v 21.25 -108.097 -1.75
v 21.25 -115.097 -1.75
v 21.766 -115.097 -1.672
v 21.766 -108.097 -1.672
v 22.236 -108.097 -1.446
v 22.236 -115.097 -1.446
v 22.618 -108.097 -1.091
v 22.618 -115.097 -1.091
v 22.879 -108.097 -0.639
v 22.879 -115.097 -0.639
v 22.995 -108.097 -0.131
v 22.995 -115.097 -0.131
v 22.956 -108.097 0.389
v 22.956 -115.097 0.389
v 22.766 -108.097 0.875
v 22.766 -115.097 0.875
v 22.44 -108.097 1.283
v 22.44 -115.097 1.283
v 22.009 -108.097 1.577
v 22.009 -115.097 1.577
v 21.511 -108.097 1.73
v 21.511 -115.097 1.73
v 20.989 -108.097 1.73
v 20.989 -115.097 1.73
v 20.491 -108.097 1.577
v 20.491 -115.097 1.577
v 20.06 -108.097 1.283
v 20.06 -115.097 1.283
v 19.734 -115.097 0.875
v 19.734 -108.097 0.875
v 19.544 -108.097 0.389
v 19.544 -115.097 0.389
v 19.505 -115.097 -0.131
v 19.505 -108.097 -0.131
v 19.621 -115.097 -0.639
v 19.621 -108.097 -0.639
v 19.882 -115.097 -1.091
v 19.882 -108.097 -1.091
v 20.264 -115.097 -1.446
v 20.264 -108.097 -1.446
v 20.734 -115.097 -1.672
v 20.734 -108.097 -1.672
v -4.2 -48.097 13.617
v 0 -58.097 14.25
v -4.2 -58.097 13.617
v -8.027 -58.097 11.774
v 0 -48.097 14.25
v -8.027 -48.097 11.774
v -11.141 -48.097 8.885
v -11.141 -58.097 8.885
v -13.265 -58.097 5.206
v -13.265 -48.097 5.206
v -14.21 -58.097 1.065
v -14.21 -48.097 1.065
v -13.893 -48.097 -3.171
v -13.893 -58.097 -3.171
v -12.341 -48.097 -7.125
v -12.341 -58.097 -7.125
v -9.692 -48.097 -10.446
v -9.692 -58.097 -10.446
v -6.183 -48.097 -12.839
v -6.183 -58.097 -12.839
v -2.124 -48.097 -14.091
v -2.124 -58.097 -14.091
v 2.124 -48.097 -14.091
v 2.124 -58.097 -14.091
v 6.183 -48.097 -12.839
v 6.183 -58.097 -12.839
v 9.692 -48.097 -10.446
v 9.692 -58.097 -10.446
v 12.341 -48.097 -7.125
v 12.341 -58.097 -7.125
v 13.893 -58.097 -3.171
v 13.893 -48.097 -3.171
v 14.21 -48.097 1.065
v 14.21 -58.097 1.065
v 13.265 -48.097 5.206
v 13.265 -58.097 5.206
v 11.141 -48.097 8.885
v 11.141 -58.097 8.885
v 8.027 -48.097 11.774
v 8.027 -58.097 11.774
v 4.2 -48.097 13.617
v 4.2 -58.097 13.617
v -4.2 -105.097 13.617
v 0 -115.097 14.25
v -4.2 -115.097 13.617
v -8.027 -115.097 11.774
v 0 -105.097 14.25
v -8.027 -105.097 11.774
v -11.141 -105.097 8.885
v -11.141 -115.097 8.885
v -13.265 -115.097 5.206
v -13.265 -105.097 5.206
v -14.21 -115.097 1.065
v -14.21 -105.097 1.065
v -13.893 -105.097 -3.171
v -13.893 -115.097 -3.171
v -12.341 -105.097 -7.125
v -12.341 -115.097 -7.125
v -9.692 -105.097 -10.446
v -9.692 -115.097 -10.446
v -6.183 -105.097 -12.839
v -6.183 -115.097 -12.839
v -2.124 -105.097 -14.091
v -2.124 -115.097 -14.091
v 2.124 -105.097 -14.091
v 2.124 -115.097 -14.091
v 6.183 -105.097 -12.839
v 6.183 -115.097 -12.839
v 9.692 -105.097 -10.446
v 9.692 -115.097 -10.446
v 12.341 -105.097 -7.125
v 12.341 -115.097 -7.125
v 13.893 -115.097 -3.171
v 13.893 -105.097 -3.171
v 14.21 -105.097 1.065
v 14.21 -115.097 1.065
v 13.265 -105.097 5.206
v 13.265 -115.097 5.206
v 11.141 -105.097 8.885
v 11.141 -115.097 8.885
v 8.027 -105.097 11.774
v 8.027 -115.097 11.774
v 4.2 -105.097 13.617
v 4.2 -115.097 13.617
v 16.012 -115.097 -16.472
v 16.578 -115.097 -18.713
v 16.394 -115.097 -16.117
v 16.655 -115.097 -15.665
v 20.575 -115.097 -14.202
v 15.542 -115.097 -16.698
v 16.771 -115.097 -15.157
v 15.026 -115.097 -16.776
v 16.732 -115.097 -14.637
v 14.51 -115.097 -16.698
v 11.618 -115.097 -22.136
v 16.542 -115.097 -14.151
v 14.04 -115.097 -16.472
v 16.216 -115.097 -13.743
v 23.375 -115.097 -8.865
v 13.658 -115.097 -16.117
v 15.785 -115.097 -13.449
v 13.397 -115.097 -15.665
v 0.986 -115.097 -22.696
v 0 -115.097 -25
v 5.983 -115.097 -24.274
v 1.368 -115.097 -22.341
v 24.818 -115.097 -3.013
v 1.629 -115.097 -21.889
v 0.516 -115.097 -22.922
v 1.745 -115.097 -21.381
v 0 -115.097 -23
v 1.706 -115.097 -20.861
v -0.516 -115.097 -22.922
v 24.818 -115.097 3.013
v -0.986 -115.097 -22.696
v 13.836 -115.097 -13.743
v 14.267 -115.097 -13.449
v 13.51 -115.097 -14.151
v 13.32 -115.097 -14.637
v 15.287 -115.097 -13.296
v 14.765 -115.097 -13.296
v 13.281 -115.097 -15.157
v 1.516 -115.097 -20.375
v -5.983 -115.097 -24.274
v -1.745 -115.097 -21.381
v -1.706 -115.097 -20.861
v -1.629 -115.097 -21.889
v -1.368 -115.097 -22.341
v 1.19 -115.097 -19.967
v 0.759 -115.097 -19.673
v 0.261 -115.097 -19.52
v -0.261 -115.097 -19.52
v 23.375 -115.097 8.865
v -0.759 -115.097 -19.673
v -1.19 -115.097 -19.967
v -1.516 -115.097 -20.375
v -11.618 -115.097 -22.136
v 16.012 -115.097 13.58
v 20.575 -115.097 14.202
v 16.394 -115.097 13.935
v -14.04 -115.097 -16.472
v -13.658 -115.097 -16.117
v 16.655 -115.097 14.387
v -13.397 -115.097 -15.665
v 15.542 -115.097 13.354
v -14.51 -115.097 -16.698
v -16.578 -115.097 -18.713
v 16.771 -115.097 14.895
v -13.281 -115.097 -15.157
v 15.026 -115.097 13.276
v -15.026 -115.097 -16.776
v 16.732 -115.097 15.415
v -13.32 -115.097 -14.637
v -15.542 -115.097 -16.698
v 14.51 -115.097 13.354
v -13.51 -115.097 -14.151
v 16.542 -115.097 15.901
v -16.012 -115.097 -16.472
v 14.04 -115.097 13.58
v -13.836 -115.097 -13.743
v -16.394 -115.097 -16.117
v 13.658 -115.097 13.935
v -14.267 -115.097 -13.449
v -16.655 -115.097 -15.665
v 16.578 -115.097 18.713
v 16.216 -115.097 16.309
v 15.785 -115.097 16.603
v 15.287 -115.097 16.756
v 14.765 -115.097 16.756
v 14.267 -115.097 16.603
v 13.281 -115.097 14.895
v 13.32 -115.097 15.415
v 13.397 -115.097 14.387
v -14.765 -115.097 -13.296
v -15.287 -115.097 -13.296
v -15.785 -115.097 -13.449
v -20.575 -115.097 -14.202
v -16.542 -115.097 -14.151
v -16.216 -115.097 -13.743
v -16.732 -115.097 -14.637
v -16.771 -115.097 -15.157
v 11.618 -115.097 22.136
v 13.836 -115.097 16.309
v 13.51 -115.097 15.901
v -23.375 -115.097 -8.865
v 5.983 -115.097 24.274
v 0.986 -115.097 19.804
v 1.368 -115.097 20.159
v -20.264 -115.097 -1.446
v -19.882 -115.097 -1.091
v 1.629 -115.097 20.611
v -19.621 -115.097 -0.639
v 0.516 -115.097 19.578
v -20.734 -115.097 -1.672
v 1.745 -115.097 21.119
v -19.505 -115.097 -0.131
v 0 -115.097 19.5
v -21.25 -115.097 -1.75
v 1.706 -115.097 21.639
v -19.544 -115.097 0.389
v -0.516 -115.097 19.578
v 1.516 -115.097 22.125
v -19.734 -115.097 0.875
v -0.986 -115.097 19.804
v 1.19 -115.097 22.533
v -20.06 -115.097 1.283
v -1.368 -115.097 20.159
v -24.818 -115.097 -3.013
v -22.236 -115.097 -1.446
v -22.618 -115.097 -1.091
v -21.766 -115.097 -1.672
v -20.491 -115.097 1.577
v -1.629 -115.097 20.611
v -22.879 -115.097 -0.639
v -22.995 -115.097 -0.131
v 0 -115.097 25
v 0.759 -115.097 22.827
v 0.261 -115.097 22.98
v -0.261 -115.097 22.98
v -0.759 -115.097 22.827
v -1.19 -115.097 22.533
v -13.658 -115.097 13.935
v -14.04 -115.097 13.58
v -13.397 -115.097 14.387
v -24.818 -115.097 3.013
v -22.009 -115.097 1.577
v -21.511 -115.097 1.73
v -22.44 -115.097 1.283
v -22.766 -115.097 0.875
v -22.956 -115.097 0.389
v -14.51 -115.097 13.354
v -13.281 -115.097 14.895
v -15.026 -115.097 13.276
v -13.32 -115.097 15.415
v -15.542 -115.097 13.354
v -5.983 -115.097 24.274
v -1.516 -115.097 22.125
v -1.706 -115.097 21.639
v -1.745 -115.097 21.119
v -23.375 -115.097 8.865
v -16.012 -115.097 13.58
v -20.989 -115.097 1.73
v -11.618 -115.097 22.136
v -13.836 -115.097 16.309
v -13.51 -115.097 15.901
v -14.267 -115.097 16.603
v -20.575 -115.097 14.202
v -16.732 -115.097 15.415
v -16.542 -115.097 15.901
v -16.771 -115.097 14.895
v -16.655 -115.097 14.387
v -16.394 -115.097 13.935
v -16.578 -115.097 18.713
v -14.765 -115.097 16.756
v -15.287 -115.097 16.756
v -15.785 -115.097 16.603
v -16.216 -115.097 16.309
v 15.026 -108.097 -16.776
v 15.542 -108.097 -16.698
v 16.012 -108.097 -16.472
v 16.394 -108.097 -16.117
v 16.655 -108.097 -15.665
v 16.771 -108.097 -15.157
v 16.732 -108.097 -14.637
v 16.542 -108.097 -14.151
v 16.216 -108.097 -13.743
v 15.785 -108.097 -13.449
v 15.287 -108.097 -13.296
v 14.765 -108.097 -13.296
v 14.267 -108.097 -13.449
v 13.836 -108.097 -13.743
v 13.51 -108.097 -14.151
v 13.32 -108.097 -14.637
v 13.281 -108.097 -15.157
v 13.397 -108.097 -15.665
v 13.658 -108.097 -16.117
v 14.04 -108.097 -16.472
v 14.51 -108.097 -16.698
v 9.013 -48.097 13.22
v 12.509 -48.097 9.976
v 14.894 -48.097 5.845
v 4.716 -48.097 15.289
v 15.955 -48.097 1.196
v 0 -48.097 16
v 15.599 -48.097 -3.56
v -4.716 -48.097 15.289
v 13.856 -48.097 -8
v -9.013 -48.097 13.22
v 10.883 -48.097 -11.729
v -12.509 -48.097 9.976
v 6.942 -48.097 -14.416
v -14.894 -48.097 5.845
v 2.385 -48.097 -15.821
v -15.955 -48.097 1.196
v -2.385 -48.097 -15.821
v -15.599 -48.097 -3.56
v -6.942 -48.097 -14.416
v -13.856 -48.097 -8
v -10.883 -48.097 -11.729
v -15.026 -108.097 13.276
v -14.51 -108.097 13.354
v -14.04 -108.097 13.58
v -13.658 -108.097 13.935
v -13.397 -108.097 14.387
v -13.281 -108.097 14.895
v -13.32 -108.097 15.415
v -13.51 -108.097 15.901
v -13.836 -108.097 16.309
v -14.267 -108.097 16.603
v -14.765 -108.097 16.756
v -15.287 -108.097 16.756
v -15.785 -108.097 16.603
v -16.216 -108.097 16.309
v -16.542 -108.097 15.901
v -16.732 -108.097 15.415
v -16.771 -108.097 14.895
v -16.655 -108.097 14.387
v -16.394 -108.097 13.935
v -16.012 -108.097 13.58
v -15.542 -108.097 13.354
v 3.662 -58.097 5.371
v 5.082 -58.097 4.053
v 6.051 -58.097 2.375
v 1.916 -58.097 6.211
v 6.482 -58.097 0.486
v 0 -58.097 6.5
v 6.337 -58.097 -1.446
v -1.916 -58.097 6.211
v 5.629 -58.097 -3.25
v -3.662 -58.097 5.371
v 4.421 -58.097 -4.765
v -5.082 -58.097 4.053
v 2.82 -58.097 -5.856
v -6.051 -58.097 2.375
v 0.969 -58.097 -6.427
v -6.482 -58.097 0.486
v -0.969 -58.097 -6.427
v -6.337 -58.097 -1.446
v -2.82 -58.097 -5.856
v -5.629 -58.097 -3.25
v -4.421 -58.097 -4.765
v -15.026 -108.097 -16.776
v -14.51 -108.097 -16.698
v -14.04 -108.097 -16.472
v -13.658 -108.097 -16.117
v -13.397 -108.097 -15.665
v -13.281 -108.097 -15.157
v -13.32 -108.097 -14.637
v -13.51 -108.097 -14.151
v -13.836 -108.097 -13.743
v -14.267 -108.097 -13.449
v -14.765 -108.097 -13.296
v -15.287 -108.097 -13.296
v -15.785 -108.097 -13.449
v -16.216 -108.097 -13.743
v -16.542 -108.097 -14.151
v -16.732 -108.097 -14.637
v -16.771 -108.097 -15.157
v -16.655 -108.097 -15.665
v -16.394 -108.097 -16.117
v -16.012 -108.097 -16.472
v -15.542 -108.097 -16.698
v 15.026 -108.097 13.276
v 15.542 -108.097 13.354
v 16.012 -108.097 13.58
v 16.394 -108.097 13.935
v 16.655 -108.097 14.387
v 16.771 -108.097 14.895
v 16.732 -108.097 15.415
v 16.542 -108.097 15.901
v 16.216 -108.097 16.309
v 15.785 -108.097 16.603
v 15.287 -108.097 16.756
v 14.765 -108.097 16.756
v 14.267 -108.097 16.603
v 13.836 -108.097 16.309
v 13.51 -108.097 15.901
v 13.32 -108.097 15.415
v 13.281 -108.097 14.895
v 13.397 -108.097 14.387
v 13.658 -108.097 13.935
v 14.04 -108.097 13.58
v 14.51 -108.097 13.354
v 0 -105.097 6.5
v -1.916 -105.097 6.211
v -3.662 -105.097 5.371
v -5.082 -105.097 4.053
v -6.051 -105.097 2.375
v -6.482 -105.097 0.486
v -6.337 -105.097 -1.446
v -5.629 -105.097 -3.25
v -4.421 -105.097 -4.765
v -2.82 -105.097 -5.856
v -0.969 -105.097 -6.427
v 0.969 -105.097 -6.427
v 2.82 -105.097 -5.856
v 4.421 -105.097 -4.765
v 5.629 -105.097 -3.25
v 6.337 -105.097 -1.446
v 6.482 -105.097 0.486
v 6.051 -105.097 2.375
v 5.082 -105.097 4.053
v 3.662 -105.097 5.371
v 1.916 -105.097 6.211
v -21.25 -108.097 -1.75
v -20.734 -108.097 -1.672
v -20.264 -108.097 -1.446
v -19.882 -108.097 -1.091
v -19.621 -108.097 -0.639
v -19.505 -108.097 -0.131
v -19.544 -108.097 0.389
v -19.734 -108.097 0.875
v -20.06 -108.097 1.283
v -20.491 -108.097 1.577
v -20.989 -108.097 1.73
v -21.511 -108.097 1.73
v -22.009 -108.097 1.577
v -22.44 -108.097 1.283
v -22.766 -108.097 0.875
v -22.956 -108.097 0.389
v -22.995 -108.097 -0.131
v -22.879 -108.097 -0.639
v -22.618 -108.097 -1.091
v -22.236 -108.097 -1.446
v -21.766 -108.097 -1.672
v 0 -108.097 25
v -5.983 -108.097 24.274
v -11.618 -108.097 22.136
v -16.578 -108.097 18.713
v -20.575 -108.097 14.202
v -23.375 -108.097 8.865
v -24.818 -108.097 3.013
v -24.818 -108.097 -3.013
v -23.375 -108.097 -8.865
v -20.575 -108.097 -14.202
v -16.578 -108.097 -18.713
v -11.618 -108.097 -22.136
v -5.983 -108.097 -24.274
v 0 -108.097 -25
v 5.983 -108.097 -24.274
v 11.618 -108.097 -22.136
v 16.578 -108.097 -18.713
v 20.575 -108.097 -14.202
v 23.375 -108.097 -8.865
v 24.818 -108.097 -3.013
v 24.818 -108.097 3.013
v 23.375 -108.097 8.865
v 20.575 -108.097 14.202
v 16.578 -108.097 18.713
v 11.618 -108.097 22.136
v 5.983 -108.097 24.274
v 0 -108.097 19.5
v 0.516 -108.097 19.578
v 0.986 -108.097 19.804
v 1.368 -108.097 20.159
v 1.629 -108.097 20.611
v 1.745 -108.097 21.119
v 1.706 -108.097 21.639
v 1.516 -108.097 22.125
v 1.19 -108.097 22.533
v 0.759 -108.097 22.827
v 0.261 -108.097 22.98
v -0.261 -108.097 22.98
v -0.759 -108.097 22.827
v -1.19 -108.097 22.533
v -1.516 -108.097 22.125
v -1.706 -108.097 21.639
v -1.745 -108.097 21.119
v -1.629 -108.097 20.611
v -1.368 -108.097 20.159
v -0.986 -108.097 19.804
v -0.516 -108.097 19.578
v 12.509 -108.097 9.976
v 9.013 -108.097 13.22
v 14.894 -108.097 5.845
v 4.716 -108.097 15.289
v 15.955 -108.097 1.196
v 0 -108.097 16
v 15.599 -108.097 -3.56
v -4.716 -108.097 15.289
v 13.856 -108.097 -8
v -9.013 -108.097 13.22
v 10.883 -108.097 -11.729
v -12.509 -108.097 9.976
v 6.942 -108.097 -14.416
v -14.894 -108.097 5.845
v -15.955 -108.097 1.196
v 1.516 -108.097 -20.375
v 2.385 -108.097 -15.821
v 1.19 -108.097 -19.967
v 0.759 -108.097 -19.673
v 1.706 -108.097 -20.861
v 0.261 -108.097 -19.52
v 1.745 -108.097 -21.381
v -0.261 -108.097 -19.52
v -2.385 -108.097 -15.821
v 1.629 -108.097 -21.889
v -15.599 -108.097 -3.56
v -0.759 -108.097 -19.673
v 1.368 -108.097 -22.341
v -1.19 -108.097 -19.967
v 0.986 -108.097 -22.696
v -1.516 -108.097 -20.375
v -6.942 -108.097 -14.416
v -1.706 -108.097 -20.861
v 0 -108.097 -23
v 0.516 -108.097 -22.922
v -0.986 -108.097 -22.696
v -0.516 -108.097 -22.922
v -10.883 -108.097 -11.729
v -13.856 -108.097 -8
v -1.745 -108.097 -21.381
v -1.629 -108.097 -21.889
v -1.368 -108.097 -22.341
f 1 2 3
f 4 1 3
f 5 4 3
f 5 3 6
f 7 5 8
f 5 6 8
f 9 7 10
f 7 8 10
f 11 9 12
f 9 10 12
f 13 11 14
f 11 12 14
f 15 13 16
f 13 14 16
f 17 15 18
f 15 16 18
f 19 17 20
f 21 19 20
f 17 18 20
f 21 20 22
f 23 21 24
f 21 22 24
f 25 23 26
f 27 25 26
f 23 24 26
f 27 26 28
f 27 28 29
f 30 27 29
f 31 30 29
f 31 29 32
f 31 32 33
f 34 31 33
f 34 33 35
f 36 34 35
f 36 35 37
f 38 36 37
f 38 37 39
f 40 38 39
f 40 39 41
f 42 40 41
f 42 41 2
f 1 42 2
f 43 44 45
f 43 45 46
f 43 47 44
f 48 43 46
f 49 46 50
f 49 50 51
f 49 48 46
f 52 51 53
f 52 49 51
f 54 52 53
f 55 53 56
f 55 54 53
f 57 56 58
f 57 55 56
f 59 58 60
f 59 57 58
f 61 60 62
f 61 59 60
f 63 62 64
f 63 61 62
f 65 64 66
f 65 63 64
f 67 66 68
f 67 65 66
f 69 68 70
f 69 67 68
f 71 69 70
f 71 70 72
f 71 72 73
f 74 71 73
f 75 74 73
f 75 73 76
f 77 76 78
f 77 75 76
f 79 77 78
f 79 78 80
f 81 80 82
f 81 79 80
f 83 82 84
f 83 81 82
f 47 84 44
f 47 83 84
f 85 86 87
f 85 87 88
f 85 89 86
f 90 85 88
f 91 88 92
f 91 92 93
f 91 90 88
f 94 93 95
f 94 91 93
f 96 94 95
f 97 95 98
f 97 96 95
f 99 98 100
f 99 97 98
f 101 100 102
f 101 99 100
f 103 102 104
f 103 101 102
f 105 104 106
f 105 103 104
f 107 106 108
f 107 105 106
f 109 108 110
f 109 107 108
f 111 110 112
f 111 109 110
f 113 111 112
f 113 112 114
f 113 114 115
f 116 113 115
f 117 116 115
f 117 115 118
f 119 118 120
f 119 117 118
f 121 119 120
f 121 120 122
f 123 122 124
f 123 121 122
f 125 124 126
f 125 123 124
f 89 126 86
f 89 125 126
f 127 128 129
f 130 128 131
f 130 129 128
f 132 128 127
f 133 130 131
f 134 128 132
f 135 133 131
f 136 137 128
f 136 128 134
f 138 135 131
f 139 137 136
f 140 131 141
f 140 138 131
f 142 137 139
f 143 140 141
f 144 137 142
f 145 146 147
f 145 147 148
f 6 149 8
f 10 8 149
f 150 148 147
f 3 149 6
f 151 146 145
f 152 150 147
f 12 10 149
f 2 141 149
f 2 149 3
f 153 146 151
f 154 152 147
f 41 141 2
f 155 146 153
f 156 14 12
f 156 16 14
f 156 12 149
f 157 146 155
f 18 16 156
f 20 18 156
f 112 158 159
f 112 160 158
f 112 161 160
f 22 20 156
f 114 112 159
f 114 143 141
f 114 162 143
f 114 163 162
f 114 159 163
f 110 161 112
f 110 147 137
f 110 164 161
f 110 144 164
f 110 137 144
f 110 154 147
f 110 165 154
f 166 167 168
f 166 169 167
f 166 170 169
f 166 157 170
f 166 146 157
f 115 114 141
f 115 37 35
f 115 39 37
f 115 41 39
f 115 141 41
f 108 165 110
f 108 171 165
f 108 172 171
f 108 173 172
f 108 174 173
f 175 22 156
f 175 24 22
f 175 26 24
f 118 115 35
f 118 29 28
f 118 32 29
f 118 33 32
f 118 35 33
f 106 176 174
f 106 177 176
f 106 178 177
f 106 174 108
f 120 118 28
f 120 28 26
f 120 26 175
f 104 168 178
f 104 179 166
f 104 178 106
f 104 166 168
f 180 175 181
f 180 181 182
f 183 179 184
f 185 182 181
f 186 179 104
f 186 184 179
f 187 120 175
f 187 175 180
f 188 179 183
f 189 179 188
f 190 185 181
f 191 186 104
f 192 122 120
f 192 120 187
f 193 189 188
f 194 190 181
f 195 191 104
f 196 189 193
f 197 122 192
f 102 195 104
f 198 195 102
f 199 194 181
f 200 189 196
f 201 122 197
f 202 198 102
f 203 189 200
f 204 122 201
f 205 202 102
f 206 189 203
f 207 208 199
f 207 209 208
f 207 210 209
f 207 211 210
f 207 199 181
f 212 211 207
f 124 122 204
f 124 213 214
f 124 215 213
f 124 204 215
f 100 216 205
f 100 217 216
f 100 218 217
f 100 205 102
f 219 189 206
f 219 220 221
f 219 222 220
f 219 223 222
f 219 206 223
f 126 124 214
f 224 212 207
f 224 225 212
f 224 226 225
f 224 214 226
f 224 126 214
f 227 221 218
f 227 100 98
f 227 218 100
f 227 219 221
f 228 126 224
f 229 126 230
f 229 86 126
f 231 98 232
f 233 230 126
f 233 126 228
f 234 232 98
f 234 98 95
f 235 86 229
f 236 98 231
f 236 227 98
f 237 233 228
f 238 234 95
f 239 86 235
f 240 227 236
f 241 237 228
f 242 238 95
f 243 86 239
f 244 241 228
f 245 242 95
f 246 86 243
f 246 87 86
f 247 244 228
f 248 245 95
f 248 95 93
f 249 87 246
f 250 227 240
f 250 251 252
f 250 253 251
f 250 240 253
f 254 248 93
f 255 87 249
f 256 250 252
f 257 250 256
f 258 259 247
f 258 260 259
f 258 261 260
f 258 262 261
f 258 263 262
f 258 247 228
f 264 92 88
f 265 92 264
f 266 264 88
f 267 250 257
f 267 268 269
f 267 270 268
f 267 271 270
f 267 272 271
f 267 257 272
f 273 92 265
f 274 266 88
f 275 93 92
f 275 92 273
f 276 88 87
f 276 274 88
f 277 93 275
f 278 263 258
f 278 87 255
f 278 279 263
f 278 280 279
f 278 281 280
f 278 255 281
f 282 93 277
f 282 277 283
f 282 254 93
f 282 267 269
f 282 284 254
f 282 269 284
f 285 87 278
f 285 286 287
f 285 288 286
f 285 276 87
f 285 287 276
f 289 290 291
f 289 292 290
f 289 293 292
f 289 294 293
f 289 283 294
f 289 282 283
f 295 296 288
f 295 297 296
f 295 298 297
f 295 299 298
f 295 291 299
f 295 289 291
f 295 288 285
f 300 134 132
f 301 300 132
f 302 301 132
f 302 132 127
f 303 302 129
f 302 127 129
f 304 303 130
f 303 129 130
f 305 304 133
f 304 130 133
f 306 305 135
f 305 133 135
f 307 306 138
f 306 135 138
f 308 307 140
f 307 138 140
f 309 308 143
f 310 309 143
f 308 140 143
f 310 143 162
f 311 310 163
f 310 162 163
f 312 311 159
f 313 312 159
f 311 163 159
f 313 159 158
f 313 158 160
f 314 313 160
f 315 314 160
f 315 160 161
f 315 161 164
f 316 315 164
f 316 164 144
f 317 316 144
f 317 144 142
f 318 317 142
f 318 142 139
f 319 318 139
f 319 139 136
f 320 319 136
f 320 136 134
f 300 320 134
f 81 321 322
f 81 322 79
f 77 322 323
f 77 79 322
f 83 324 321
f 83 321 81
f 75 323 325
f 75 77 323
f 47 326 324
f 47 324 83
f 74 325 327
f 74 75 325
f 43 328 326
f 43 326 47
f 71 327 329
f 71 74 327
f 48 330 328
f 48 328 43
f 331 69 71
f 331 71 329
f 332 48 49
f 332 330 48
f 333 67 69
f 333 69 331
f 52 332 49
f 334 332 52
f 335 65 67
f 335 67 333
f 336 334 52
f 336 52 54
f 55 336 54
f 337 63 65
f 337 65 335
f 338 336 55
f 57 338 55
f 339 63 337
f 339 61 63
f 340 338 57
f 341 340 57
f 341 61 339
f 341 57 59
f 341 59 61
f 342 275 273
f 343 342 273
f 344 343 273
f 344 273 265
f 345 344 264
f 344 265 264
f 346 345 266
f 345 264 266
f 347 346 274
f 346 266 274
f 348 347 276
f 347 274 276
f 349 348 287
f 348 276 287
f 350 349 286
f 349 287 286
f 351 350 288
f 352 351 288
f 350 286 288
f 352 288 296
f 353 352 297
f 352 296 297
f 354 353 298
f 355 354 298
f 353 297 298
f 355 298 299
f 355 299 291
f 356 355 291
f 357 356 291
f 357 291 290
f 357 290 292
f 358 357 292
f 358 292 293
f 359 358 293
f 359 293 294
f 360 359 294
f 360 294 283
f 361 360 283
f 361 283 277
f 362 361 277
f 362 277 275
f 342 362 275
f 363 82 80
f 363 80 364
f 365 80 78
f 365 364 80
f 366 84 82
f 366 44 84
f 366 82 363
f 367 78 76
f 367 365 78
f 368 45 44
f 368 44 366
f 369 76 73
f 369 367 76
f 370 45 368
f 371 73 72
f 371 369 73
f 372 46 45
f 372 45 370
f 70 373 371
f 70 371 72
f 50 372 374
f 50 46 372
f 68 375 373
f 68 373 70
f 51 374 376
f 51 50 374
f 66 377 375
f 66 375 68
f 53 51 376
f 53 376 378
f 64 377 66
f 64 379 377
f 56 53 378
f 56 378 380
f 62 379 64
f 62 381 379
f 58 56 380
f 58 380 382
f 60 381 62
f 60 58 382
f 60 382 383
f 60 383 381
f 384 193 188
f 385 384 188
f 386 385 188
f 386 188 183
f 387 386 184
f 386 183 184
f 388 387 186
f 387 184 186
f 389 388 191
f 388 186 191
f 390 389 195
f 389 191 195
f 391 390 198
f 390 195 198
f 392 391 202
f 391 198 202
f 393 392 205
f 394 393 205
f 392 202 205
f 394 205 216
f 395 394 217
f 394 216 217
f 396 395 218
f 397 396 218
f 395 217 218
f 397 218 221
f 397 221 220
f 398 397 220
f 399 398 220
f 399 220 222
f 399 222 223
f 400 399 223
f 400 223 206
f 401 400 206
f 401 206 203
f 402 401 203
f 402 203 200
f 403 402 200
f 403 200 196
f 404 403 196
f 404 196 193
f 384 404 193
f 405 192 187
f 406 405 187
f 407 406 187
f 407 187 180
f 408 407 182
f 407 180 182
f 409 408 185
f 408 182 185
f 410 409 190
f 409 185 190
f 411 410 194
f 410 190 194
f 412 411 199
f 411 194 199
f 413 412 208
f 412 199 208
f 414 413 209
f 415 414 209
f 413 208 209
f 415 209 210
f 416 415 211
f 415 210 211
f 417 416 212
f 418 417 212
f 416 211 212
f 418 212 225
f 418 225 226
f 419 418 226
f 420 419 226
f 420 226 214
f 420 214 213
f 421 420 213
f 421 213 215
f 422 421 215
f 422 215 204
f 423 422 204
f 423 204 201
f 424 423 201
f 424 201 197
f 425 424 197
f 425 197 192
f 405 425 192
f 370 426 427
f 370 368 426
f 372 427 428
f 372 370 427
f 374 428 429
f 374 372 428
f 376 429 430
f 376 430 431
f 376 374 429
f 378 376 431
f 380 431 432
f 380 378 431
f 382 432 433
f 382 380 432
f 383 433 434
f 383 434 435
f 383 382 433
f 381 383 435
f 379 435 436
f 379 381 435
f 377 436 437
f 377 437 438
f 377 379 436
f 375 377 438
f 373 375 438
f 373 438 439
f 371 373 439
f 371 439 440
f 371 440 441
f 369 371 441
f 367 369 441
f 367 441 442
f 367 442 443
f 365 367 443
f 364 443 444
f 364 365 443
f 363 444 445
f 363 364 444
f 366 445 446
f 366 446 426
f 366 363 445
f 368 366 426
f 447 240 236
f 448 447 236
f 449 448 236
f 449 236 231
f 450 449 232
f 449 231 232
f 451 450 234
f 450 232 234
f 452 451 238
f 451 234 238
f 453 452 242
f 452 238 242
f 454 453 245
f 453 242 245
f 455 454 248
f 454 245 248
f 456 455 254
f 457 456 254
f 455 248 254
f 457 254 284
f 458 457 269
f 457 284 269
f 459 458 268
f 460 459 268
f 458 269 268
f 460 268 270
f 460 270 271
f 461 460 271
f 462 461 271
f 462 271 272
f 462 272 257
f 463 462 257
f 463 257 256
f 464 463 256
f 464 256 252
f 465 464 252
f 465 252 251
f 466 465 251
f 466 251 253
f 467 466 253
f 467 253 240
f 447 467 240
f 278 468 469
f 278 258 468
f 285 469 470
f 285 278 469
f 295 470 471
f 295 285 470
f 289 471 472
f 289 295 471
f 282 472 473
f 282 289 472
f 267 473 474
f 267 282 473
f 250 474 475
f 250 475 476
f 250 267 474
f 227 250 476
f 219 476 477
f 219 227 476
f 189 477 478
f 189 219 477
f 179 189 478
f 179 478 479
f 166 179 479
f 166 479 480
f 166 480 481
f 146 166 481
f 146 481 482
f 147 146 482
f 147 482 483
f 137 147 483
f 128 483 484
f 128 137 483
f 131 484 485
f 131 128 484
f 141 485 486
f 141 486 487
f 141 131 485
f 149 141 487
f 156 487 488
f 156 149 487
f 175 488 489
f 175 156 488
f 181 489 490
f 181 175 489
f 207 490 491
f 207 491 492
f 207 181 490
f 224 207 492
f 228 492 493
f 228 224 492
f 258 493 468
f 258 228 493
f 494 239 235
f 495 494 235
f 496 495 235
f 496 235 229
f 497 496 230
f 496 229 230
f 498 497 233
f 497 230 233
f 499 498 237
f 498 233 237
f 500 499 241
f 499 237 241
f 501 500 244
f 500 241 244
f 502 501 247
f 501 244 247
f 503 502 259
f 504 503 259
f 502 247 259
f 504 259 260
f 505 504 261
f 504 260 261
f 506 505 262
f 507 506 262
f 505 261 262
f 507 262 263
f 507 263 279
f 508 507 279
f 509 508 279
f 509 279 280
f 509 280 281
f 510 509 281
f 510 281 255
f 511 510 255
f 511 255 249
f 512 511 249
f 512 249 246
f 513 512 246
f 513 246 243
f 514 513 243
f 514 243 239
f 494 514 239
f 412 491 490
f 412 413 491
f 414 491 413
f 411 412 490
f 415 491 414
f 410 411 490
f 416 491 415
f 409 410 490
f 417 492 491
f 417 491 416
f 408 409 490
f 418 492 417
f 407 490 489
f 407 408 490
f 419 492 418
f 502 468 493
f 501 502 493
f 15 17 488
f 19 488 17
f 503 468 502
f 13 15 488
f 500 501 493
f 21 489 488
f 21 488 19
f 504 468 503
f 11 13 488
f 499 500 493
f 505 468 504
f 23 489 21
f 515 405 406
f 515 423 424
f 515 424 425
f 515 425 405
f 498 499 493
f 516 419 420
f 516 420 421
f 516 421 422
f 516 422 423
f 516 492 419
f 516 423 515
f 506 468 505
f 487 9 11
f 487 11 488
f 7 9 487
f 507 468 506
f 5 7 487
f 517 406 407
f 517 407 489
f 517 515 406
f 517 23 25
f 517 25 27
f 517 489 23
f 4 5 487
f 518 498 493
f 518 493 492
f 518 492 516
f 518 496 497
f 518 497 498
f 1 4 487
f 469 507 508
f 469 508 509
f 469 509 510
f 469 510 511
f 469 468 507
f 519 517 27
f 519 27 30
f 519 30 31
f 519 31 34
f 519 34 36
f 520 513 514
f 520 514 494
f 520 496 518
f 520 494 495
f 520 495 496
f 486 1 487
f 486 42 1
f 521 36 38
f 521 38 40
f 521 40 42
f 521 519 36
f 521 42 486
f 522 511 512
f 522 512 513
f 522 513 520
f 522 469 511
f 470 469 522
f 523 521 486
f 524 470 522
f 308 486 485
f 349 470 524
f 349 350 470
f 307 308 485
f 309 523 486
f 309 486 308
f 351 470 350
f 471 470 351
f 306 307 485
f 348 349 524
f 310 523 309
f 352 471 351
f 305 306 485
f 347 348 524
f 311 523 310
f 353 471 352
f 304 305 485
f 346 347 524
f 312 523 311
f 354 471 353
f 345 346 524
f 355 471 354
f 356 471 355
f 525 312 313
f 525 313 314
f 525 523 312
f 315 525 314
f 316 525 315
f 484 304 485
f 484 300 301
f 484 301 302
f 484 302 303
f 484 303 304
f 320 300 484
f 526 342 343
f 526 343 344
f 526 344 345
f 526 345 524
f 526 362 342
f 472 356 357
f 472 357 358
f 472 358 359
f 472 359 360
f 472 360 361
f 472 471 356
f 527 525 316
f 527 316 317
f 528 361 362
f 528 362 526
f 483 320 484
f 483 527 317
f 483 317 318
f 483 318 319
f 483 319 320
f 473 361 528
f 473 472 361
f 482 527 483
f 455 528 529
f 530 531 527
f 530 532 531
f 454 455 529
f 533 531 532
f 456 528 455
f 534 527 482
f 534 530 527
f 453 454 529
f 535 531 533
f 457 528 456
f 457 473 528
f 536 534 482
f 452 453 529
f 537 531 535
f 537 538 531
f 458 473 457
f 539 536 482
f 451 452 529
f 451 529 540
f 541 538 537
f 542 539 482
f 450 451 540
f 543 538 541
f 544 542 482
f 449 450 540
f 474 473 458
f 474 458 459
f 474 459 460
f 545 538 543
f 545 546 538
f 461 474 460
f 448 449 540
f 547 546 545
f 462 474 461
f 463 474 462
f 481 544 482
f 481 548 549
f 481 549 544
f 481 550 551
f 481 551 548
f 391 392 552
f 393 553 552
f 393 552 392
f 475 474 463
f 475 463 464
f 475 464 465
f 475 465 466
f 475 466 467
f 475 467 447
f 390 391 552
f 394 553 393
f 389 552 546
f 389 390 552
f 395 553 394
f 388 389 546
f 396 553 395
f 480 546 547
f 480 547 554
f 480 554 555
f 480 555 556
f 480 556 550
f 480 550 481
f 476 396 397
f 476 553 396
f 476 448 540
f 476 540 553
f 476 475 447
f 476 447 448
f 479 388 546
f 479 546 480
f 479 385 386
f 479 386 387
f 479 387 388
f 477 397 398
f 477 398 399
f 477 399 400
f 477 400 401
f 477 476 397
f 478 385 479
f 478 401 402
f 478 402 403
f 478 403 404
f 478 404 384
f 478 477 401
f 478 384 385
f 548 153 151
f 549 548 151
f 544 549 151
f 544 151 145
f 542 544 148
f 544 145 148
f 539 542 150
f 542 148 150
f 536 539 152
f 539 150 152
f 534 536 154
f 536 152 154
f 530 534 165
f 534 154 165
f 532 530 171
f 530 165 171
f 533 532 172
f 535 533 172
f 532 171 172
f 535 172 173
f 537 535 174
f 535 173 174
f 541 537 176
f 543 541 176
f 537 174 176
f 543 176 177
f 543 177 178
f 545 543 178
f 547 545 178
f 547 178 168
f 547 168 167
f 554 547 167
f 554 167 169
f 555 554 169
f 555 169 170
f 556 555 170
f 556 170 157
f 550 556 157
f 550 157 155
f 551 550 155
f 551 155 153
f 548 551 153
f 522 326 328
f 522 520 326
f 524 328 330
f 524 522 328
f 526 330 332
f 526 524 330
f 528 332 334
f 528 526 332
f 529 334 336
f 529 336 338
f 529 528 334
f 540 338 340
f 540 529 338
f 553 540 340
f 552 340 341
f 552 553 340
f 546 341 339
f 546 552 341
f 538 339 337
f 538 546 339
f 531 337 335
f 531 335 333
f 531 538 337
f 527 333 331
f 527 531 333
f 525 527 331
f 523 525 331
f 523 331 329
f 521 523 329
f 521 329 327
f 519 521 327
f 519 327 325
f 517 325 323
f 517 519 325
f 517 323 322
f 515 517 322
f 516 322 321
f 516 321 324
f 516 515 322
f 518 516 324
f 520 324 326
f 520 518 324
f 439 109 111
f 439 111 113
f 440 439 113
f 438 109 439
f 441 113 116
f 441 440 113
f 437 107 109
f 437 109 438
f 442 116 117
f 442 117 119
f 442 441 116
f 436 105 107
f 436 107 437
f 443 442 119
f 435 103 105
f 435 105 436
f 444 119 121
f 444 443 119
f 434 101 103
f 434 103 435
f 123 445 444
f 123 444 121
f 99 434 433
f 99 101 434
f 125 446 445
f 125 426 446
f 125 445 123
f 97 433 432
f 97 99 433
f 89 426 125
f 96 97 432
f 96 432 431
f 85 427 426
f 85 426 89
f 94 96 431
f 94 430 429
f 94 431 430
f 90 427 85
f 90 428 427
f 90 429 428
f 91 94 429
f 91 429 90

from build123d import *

# Parameters (mm, degrees)
SKETCH3_R          = 1.75
CUT_EXTRUDE1_DEPTH = 10


with BuildPart() as part:
    # Sketch1 → Revolve1 (revolve)
    with BuildSketch(Plane(origin=(0, 0, 0), x_dir=(0, 0, -1), z_dir=(1, 0, 0))):
        Polygon((-16, -48.096567582), (-16, -108.096567582), (-25, -108.096567582), (-25, -115.096567582), (-14.25, -115.096567582), (-14.25, -105.096567582), (-6.5, -105.096567582), (-6.5, -58.096567582), (-14.25, -58.096567582), (-14.25, -48.096567582), align=None)
    revolve(axis=Axis((0, 150, 0), (0, -1, 0)))

    # Sketch3 → Cut-Extrude1 (cut)
    with BuildSketch(Plane.XZ.offset(115.096567582)):
        with Locations(Location((0, -21.25, 0), (0, 0, 270))):
            Circle(SKETCH3_R)
        with Locations(Location((-15.0260191, -15.0260191, 0), (0, 0, 270))):
            Circle(SKETCH3_R)
        with Locations(Location((-21.25, 0, 0), (0, 0, 270))):
            Circle(SKETCH3_R)
        with Locations(Location((-15.0260191, 15.0260191, 0), (0, 0, 270))):
            Circle(SKETCH3_R)
        with Locations(Location((0, 21.25, 0), (0, 0, 270))):
            Circle(SKETCH3_R)
        with Locations(Location((15.0260191, 15.0260191, 0), (0, 0, 270))):
            Circle(SKETCH3_R)
        with Locations(Location((21.25, 0, 0), (0, 0, 270))):
            Circle(SKETCH3_R)
        with Locations(Location((15.0260191, -15.0260191, 0), (0, 0, 270))):
            Circle(SKETCH3_R)
    extrude(amount=-CUT_EXTRUDE1_DEPTH, mode=Mode.SUBTRACT)


solid = part.part
